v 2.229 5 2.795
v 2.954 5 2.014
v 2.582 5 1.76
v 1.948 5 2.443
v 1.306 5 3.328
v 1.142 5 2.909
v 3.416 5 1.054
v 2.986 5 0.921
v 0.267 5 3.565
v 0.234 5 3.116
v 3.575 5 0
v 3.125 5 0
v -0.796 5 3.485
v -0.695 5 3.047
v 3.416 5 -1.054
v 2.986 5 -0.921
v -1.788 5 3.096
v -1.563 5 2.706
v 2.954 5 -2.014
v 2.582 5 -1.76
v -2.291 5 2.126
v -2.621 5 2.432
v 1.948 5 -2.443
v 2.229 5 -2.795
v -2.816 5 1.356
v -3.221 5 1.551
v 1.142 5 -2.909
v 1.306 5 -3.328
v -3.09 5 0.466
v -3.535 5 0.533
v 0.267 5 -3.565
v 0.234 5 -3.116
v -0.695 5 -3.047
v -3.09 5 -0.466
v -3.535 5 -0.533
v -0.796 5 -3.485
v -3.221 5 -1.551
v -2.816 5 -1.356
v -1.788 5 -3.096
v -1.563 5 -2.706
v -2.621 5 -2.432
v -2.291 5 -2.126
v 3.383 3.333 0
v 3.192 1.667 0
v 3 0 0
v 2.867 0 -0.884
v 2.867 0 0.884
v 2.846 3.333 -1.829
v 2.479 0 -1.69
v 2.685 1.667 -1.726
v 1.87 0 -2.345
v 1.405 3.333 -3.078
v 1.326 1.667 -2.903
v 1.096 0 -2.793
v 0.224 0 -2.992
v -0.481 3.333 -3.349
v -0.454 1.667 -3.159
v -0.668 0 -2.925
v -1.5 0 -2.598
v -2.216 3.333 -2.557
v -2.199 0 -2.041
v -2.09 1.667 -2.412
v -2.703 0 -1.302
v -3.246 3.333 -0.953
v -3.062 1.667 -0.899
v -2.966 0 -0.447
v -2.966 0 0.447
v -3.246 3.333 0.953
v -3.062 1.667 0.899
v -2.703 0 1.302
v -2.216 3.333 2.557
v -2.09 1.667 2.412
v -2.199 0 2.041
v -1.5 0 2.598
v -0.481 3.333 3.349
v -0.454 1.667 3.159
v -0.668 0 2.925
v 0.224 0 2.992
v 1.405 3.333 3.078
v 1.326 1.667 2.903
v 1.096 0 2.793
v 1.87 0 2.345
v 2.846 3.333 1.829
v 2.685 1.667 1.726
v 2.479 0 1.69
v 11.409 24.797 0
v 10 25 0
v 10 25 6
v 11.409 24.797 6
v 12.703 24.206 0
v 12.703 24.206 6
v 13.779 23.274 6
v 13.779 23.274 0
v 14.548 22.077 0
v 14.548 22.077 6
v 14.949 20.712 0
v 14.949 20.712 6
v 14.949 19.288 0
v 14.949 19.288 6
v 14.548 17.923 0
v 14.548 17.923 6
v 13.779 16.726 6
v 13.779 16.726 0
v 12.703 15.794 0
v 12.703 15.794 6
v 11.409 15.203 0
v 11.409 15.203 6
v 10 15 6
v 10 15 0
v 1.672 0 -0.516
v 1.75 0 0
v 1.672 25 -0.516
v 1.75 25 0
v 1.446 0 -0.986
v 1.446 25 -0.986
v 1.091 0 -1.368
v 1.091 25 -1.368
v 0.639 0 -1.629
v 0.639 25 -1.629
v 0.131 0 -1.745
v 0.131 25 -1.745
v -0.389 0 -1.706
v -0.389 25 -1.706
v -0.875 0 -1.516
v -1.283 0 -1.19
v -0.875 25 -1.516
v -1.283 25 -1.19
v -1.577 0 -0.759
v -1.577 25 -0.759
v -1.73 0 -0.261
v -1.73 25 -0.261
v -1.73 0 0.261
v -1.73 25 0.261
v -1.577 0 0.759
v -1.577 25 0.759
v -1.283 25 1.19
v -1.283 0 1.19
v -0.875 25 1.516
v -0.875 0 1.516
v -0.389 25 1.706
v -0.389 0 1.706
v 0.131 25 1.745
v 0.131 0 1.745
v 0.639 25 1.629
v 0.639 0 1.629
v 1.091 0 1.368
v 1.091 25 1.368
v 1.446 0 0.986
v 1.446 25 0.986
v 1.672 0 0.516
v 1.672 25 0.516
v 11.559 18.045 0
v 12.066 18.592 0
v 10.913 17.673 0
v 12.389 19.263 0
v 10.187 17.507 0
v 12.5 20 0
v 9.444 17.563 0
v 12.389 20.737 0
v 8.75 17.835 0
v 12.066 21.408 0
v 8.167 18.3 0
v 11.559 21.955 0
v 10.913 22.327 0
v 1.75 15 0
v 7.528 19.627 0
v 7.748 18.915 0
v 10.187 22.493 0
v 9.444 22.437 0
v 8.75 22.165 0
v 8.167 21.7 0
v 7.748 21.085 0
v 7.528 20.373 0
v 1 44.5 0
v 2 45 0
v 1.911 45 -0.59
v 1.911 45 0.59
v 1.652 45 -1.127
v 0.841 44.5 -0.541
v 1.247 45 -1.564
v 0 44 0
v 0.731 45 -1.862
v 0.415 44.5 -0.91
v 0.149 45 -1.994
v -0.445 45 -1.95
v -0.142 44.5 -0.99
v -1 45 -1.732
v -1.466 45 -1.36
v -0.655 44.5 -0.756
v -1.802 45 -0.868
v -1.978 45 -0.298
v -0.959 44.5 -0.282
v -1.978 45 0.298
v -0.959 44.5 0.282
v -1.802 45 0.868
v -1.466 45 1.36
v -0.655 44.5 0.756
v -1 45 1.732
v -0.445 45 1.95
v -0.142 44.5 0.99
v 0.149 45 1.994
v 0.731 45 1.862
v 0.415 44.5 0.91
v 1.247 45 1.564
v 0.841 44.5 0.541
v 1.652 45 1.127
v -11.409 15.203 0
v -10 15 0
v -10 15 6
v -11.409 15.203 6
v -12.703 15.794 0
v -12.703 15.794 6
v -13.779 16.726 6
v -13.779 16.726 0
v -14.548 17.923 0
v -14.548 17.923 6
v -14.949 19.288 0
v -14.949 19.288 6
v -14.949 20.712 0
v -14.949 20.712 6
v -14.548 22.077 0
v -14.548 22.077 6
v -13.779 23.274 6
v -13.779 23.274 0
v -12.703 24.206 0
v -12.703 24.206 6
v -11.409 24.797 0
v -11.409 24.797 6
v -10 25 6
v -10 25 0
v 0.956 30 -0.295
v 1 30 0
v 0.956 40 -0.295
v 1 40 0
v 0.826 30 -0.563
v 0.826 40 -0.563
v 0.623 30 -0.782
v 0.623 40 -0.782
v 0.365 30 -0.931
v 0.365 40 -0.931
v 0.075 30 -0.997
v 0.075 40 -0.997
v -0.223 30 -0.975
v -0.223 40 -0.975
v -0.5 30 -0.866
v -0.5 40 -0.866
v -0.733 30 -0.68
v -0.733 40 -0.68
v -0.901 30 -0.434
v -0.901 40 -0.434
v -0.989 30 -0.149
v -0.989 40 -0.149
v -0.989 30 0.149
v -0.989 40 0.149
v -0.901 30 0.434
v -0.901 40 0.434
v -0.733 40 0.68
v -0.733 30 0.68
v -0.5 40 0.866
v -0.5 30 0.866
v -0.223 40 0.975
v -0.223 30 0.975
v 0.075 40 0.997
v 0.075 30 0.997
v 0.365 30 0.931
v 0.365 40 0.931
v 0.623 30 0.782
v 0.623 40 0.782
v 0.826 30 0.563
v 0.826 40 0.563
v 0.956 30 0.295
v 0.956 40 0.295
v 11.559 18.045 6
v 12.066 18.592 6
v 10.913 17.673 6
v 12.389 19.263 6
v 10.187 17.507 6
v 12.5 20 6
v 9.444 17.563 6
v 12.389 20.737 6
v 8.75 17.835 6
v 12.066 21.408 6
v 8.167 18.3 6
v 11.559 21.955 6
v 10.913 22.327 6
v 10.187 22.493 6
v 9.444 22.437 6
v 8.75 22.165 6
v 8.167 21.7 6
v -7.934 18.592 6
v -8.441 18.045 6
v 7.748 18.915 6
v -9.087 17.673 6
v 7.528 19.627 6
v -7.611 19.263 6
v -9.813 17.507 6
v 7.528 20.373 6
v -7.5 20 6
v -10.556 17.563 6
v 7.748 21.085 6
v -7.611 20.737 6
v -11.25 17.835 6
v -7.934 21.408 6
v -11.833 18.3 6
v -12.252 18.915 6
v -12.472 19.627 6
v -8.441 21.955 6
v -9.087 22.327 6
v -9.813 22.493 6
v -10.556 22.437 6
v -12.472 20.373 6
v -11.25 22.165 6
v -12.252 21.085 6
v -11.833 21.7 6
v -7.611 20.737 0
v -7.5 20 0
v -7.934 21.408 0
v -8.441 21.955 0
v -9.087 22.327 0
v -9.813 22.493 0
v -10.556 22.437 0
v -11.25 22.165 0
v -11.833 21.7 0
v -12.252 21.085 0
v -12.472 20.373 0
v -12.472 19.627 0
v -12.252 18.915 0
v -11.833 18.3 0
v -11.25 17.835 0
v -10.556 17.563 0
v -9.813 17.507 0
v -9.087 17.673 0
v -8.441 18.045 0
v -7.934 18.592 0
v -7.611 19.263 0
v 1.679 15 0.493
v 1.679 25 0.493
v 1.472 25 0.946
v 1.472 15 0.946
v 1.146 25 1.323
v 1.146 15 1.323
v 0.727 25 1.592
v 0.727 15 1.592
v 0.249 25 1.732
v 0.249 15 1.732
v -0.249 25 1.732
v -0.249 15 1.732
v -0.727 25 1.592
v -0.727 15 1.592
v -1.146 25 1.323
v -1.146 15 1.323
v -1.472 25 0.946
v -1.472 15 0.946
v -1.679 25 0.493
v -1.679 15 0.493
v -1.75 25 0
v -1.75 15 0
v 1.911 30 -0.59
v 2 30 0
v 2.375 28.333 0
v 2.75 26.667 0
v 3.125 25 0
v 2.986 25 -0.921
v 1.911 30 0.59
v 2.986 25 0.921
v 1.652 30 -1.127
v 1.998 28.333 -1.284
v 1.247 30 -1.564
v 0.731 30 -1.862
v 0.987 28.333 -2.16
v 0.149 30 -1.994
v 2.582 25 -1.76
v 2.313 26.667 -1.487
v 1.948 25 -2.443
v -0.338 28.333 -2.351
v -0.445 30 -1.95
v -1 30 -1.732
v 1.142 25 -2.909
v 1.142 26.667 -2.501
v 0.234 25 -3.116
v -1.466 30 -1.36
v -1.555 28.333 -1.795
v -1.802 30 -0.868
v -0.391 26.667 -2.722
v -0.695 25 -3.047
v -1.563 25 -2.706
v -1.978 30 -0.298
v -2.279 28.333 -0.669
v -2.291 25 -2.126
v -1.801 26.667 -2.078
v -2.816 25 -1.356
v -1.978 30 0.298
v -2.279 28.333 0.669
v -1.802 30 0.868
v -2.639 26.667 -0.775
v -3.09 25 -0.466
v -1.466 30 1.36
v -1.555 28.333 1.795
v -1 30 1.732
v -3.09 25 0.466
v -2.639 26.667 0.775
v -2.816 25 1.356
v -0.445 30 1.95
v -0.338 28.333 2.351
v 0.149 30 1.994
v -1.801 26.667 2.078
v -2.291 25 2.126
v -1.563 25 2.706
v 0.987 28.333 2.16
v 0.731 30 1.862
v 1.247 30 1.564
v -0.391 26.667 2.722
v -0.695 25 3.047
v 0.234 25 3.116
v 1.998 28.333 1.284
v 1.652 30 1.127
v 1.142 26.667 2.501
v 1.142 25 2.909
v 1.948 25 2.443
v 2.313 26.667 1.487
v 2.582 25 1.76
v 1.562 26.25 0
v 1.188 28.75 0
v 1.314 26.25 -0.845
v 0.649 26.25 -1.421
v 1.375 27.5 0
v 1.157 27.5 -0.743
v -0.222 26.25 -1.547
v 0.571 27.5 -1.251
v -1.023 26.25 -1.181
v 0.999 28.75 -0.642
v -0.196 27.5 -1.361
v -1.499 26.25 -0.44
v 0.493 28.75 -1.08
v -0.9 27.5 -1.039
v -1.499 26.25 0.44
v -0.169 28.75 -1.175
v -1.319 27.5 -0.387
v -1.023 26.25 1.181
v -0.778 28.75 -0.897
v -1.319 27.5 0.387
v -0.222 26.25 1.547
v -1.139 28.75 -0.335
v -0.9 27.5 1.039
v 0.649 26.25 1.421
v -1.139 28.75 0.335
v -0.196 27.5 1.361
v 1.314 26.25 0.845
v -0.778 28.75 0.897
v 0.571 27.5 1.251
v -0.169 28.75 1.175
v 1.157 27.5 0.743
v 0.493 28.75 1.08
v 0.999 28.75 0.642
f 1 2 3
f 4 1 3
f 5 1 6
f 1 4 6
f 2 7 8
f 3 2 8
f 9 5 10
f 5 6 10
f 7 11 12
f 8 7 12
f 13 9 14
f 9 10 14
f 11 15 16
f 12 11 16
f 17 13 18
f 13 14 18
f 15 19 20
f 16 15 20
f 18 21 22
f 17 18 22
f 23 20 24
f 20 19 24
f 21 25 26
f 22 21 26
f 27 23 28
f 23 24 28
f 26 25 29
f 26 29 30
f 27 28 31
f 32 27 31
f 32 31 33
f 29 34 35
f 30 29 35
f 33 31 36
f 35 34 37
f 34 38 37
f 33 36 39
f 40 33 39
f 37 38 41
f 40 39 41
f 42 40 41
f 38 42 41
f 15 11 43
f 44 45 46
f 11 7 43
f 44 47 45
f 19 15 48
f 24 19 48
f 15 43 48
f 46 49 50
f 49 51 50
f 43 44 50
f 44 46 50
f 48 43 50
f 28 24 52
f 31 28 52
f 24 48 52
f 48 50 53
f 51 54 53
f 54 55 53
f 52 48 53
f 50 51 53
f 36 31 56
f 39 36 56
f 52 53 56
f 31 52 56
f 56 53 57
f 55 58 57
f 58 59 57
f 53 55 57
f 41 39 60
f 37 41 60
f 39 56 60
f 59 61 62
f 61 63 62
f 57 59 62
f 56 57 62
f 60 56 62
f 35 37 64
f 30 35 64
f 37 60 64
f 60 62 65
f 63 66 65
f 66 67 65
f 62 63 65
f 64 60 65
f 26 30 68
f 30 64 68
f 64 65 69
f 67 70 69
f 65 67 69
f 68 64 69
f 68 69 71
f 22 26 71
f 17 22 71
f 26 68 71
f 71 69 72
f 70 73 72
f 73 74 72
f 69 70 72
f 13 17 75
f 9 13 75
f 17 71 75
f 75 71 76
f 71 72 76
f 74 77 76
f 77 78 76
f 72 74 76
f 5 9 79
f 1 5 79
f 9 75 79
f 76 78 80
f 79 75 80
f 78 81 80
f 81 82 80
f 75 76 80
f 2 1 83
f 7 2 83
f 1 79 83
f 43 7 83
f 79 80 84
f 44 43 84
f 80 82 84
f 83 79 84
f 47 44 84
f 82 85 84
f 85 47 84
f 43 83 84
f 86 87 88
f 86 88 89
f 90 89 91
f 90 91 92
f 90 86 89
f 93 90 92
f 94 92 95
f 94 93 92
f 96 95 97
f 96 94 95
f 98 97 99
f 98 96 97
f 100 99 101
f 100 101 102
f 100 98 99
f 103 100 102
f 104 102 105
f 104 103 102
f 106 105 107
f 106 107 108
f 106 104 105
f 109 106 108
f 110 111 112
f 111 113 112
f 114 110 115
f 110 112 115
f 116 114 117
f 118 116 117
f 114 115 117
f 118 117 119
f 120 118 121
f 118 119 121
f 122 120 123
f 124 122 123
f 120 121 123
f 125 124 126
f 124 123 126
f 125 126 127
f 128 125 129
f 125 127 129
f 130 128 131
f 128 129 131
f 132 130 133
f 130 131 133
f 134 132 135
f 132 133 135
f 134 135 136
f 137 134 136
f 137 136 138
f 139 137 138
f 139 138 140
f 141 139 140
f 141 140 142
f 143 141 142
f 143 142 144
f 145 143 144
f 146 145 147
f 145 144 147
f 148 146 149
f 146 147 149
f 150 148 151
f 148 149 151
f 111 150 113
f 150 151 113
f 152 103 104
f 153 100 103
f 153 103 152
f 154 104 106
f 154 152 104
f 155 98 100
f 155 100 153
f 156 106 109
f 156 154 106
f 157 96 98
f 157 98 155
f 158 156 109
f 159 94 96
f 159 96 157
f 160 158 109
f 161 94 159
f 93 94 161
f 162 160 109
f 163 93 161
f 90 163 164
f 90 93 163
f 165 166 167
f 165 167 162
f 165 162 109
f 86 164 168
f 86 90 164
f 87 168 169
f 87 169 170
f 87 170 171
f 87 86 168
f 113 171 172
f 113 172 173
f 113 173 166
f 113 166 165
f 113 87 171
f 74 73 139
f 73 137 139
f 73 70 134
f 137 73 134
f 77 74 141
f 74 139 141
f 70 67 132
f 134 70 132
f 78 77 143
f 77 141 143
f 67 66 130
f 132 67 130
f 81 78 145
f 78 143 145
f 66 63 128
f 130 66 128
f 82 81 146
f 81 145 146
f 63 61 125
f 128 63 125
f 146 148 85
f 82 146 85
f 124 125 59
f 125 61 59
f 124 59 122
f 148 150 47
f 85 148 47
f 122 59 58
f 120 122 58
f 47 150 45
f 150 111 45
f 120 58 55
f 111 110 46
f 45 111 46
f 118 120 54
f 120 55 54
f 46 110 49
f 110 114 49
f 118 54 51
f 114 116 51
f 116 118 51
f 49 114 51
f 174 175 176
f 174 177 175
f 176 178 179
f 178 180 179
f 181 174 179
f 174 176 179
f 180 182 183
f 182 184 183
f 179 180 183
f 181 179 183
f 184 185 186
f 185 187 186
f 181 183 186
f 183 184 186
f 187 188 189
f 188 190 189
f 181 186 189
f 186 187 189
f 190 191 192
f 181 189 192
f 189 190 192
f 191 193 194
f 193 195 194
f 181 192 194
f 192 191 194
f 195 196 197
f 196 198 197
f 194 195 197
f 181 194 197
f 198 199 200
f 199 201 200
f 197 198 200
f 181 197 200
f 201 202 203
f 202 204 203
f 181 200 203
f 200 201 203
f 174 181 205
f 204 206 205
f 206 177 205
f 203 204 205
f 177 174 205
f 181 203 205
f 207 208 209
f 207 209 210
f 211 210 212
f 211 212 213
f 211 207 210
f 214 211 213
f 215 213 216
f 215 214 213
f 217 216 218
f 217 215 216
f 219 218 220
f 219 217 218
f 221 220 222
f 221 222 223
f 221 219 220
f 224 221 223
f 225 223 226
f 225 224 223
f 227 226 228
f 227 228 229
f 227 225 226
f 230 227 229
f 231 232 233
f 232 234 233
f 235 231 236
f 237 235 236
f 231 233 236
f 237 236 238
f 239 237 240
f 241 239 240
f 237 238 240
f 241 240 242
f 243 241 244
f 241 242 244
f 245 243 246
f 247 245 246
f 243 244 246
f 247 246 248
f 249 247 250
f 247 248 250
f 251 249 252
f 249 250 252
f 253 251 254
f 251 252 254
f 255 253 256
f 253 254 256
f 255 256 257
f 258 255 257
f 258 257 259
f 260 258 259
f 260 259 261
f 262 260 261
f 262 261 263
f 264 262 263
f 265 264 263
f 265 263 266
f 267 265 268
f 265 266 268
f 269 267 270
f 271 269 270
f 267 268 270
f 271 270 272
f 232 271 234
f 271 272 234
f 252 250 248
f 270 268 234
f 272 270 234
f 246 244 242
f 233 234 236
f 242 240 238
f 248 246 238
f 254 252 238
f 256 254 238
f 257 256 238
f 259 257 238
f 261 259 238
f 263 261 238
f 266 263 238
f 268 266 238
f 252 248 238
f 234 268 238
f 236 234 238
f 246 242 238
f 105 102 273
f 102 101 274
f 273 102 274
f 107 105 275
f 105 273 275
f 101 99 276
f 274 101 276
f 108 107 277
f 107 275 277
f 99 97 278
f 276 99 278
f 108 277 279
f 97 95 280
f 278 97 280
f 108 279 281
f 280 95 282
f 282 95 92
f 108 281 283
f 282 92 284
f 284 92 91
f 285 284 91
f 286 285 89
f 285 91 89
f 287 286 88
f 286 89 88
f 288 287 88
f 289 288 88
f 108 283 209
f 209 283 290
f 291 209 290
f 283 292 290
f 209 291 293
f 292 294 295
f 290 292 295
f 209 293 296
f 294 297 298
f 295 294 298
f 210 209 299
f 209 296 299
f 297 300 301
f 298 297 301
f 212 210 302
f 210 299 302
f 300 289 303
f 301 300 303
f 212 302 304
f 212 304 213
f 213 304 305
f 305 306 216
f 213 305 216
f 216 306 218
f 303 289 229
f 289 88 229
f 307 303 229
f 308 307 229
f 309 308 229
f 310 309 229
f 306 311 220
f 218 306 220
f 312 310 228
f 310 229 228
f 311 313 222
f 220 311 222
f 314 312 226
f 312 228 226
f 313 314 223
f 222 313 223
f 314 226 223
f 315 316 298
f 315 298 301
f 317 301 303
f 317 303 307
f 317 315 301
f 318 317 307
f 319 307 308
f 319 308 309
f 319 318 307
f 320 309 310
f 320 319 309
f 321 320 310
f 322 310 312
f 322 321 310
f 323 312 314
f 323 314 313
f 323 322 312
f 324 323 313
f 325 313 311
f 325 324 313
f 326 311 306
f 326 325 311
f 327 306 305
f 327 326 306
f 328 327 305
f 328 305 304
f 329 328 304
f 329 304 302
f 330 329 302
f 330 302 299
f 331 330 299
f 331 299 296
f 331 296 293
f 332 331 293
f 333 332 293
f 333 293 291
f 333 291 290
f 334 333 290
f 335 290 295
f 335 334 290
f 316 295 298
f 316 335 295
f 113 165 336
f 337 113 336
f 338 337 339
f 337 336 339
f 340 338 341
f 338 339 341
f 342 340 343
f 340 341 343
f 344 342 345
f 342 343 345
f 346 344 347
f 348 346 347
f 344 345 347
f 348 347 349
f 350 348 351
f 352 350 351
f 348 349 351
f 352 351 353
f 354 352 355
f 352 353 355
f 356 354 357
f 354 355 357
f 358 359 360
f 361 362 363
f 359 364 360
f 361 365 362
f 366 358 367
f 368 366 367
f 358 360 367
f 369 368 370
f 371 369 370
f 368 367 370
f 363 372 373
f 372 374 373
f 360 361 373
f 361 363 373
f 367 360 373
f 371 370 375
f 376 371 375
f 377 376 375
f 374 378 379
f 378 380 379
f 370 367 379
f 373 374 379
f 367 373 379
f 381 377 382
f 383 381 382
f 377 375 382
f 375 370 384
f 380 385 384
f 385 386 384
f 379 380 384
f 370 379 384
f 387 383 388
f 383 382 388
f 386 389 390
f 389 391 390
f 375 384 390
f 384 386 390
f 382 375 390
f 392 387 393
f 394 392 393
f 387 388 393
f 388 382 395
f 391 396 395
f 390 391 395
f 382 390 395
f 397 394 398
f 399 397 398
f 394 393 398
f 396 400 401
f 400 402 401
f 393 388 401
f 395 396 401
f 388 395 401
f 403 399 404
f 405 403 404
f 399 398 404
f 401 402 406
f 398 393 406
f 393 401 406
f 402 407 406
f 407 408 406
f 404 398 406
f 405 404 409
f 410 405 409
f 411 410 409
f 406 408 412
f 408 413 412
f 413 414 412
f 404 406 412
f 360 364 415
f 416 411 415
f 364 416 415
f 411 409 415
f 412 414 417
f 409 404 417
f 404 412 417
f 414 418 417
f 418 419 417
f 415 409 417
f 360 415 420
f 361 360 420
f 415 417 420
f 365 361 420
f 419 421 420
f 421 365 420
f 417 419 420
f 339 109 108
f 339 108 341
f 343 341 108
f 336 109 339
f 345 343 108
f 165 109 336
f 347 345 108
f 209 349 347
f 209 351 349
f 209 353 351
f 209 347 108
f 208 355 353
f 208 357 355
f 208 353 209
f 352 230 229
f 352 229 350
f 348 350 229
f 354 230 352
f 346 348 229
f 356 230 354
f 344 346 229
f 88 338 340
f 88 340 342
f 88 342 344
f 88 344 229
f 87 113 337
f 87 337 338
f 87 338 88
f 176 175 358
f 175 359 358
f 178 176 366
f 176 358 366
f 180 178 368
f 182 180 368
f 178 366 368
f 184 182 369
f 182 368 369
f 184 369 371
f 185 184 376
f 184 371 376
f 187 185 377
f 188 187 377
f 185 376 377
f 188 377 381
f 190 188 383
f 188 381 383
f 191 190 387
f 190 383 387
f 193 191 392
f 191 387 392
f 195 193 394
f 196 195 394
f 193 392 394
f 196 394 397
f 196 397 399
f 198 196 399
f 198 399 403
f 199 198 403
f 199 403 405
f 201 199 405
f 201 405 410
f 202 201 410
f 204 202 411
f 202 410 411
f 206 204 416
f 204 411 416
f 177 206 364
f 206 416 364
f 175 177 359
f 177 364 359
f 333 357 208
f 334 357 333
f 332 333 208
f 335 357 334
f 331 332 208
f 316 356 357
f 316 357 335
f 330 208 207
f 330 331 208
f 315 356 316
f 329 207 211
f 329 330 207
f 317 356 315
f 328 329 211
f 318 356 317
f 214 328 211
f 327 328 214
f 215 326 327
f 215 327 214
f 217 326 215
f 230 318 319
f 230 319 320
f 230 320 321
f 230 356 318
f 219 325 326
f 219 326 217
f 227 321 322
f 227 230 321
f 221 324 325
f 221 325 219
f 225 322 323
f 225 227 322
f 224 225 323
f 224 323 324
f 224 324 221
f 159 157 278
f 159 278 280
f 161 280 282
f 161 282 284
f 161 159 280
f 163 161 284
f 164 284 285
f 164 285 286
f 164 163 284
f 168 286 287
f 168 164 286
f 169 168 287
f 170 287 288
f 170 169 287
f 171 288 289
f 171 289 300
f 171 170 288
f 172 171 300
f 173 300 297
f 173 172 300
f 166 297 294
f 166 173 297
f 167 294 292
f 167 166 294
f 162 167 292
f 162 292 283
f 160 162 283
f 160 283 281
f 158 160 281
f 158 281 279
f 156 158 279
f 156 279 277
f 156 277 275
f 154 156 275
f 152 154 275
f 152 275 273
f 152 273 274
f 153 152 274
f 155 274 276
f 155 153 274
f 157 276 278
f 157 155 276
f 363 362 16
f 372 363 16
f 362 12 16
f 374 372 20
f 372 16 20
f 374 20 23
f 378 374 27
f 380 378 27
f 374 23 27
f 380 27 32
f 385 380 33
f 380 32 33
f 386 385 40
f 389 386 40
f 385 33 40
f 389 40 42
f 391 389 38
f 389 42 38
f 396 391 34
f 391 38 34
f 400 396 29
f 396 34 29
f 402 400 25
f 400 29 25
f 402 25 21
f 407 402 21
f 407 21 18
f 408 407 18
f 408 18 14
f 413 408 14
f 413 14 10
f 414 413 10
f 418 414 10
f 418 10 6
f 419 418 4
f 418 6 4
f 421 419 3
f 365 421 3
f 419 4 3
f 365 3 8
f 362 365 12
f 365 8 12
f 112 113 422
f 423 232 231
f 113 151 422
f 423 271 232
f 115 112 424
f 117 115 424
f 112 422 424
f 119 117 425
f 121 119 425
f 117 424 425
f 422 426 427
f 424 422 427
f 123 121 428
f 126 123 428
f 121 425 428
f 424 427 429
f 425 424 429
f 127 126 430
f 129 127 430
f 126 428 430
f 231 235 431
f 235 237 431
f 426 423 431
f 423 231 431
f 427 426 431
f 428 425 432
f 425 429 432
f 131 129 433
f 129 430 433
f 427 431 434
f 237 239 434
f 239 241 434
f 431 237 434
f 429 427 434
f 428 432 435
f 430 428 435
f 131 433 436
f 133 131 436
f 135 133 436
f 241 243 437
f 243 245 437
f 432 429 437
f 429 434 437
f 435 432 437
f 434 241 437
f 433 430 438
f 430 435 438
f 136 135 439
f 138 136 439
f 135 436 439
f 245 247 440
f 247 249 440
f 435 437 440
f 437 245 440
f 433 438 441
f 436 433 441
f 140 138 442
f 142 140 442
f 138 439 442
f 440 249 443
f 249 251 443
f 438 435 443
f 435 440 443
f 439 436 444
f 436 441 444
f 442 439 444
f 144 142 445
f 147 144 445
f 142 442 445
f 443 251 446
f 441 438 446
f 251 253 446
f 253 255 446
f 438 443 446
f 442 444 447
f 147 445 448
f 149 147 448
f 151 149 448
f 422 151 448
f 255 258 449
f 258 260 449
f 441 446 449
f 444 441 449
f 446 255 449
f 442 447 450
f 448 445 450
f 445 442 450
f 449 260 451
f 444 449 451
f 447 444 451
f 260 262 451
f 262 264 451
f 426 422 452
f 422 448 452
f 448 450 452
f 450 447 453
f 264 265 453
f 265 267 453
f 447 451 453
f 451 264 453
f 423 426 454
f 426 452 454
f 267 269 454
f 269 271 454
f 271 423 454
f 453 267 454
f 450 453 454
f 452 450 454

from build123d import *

# Parameters (mm, degrees)
SKETCH2_R           = 2.5
BOSS_EXTRUDE1_DEPTH = 6
SKETCH3_R           = 1.75
CUT_EXTRUDE1_DEPTH  = 25


with BuildPart() as part:
    # Sketch1 → Revolve1 (revolve)
    with BuildSketch(Plane.XY):
        Polygon((2, 30), (3.125, 25), (3.125, 5), (3.575, 5), (3, 0), (1.75, 0), (1.75, 25), (1, 30), (1, 40), (0, 40), (0, 44), (2, 45), align=None)
    revolve(axis=Axis((0, 0, 0), (0, 1, 0)))


with BuildPart() as body_2:
    # Sketch2 → Boss-Extrude1 (new body)
    with BuildSketch(Plane.XY):
        with BuildLine():
            Line((-10, 25), (10, 25))
            ThreePointArc((10, 25), (15, 20), (10, 15))
            Line((10, 15), (-10, 15))
            ThreePointArc((-10, 15), (-15, 20), (-10, 25))
        make_face()
        with Locations((-10, 20)):
            Circle(SKETCH2_R, mode=Mode.SUBTRACT)
        with Locations((10, 20)):
            Circle(SKETCH2_R, mode=Mode.SUBTRACT)
    extrude(amount=BOSS_EXTRUDE1_DEPTH)

    # Sketch3 → Cut-Extrude1 (cut)
    with BuildSketch(Plane.XZ):
        Circle(SKETCH3_R)
    extrude(amount=-CUT_EXTRUDE1_DEPTH, mode=Mode.SUBTRACT)


solid = Compound([part.part, body_2.part])
